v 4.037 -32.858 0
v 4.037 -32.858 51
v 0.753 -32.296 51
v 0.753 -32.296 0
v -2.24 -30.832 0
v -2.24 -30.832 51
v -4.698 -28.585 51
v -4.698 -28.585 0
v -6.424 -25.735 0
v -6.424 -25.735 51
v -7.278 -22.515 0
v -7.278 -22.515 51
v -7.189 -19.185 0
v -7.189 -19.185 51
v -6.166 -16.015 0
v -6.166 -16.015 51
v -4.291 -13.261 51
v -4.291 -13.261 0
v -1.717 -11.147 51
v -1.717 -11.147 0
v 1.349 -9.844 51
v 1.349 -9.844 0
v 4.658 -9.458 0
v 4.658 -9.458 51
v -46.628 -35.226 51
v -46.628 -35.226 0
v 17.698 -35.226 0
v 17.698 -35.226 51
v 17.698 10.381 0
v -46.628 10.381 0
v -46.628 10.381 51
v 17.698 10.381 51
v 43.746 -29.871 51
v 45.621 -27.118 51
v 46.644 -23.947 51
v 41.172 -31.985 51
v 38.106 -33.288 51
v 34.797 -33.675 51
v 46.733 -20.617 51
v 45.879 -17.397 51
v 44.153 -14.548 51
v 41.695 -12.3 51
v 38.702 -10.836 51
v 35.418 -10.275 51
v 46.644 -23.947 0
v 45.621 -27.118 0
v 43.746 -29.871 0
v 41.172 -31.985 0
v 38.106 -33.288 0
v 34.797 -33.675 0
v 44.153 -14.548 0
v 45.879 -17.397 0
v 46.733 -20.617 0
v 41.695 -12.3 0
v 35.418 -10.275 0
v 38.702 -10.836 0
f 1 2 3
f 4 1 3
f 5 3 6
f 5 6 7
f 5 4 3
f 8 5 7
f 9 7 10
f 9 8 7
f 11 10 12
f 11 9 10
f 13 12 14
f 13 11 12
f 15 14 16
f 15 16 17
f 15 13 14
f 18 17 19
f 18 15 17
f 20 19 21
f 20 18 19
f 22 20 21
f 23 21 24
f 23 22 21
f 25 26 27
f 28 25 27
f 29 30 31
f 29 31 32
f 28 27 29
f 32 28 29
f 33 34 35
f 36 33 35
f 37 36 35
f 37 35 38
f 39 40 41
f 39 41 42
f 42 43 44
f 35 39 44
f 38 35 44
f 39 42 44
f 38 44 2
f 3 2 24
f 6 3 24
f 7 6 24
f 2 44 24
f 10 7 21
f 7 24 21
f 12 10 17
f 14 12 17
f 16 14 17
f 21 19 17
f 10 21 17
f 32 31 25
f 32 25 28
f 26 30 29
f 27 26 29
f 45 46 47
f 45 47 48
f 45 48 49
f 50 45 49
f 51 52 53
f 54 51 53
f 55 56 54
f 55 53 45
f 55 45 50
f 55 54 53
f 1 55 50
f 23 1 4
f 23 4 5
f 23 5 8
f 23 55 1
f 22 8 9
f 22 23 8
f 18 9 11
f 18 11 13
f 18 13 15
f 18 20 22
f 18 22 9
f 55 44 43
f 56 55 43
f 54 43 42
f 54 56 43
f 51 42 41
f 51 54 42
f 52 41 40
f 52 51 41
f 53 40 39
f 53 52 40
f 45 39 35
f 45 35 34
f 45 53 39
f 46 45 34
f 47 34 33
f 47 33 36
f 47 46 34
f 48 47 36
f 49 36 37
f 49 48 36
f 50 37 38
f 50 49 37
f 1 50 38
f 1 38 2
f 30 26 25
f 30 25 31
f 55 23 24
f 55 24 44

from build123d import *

# Parameters (mm, degrees)
SKETCH2_W           = 64.325846528
SKETCH2_H           = 45.60668484
BOSS_EXTRUDE1_DEPTH = 51
BOSS_EXTRUDE2_DEPTH = 51


with BuildPart() as part:
    # Sketch2 → Boss-Extrude1 (new body)
    with BuildSketch(Plane.XY):
        with Locations((-14.464806759, -12.422716393)):
            Rectangle(SKETCH2_W, SKETCH2_H)
    extrude(amount=BOSS_EXTRUDE1_DEPTH)


with BuildPart() as body_2:
    # Sketch3 → Boss-Extrude2 (new body)
    with BuildSketch(Plane.XY):
        with BuildLine():
            Line((34.79695587, -33.674535843), (4.036573747, -32.85752552))
            ThreePointArc((4.036573747, -32.85752552), (-7.352539417, -20.846904325), (4.658081778, -9.457791161))
            Line((4.658081778, -9.457791161), (35.418463901, -10.274801484))
            ThreePointArc((35.418463901, -10.274801484), (46.807577065, -22.285422679), (34.79695587, -33.674535843))
        make_face()
    extrude(amount=BOSS_EXTRUDE2_DEPTH)


solid = Compound([part.part, body_2.part])
